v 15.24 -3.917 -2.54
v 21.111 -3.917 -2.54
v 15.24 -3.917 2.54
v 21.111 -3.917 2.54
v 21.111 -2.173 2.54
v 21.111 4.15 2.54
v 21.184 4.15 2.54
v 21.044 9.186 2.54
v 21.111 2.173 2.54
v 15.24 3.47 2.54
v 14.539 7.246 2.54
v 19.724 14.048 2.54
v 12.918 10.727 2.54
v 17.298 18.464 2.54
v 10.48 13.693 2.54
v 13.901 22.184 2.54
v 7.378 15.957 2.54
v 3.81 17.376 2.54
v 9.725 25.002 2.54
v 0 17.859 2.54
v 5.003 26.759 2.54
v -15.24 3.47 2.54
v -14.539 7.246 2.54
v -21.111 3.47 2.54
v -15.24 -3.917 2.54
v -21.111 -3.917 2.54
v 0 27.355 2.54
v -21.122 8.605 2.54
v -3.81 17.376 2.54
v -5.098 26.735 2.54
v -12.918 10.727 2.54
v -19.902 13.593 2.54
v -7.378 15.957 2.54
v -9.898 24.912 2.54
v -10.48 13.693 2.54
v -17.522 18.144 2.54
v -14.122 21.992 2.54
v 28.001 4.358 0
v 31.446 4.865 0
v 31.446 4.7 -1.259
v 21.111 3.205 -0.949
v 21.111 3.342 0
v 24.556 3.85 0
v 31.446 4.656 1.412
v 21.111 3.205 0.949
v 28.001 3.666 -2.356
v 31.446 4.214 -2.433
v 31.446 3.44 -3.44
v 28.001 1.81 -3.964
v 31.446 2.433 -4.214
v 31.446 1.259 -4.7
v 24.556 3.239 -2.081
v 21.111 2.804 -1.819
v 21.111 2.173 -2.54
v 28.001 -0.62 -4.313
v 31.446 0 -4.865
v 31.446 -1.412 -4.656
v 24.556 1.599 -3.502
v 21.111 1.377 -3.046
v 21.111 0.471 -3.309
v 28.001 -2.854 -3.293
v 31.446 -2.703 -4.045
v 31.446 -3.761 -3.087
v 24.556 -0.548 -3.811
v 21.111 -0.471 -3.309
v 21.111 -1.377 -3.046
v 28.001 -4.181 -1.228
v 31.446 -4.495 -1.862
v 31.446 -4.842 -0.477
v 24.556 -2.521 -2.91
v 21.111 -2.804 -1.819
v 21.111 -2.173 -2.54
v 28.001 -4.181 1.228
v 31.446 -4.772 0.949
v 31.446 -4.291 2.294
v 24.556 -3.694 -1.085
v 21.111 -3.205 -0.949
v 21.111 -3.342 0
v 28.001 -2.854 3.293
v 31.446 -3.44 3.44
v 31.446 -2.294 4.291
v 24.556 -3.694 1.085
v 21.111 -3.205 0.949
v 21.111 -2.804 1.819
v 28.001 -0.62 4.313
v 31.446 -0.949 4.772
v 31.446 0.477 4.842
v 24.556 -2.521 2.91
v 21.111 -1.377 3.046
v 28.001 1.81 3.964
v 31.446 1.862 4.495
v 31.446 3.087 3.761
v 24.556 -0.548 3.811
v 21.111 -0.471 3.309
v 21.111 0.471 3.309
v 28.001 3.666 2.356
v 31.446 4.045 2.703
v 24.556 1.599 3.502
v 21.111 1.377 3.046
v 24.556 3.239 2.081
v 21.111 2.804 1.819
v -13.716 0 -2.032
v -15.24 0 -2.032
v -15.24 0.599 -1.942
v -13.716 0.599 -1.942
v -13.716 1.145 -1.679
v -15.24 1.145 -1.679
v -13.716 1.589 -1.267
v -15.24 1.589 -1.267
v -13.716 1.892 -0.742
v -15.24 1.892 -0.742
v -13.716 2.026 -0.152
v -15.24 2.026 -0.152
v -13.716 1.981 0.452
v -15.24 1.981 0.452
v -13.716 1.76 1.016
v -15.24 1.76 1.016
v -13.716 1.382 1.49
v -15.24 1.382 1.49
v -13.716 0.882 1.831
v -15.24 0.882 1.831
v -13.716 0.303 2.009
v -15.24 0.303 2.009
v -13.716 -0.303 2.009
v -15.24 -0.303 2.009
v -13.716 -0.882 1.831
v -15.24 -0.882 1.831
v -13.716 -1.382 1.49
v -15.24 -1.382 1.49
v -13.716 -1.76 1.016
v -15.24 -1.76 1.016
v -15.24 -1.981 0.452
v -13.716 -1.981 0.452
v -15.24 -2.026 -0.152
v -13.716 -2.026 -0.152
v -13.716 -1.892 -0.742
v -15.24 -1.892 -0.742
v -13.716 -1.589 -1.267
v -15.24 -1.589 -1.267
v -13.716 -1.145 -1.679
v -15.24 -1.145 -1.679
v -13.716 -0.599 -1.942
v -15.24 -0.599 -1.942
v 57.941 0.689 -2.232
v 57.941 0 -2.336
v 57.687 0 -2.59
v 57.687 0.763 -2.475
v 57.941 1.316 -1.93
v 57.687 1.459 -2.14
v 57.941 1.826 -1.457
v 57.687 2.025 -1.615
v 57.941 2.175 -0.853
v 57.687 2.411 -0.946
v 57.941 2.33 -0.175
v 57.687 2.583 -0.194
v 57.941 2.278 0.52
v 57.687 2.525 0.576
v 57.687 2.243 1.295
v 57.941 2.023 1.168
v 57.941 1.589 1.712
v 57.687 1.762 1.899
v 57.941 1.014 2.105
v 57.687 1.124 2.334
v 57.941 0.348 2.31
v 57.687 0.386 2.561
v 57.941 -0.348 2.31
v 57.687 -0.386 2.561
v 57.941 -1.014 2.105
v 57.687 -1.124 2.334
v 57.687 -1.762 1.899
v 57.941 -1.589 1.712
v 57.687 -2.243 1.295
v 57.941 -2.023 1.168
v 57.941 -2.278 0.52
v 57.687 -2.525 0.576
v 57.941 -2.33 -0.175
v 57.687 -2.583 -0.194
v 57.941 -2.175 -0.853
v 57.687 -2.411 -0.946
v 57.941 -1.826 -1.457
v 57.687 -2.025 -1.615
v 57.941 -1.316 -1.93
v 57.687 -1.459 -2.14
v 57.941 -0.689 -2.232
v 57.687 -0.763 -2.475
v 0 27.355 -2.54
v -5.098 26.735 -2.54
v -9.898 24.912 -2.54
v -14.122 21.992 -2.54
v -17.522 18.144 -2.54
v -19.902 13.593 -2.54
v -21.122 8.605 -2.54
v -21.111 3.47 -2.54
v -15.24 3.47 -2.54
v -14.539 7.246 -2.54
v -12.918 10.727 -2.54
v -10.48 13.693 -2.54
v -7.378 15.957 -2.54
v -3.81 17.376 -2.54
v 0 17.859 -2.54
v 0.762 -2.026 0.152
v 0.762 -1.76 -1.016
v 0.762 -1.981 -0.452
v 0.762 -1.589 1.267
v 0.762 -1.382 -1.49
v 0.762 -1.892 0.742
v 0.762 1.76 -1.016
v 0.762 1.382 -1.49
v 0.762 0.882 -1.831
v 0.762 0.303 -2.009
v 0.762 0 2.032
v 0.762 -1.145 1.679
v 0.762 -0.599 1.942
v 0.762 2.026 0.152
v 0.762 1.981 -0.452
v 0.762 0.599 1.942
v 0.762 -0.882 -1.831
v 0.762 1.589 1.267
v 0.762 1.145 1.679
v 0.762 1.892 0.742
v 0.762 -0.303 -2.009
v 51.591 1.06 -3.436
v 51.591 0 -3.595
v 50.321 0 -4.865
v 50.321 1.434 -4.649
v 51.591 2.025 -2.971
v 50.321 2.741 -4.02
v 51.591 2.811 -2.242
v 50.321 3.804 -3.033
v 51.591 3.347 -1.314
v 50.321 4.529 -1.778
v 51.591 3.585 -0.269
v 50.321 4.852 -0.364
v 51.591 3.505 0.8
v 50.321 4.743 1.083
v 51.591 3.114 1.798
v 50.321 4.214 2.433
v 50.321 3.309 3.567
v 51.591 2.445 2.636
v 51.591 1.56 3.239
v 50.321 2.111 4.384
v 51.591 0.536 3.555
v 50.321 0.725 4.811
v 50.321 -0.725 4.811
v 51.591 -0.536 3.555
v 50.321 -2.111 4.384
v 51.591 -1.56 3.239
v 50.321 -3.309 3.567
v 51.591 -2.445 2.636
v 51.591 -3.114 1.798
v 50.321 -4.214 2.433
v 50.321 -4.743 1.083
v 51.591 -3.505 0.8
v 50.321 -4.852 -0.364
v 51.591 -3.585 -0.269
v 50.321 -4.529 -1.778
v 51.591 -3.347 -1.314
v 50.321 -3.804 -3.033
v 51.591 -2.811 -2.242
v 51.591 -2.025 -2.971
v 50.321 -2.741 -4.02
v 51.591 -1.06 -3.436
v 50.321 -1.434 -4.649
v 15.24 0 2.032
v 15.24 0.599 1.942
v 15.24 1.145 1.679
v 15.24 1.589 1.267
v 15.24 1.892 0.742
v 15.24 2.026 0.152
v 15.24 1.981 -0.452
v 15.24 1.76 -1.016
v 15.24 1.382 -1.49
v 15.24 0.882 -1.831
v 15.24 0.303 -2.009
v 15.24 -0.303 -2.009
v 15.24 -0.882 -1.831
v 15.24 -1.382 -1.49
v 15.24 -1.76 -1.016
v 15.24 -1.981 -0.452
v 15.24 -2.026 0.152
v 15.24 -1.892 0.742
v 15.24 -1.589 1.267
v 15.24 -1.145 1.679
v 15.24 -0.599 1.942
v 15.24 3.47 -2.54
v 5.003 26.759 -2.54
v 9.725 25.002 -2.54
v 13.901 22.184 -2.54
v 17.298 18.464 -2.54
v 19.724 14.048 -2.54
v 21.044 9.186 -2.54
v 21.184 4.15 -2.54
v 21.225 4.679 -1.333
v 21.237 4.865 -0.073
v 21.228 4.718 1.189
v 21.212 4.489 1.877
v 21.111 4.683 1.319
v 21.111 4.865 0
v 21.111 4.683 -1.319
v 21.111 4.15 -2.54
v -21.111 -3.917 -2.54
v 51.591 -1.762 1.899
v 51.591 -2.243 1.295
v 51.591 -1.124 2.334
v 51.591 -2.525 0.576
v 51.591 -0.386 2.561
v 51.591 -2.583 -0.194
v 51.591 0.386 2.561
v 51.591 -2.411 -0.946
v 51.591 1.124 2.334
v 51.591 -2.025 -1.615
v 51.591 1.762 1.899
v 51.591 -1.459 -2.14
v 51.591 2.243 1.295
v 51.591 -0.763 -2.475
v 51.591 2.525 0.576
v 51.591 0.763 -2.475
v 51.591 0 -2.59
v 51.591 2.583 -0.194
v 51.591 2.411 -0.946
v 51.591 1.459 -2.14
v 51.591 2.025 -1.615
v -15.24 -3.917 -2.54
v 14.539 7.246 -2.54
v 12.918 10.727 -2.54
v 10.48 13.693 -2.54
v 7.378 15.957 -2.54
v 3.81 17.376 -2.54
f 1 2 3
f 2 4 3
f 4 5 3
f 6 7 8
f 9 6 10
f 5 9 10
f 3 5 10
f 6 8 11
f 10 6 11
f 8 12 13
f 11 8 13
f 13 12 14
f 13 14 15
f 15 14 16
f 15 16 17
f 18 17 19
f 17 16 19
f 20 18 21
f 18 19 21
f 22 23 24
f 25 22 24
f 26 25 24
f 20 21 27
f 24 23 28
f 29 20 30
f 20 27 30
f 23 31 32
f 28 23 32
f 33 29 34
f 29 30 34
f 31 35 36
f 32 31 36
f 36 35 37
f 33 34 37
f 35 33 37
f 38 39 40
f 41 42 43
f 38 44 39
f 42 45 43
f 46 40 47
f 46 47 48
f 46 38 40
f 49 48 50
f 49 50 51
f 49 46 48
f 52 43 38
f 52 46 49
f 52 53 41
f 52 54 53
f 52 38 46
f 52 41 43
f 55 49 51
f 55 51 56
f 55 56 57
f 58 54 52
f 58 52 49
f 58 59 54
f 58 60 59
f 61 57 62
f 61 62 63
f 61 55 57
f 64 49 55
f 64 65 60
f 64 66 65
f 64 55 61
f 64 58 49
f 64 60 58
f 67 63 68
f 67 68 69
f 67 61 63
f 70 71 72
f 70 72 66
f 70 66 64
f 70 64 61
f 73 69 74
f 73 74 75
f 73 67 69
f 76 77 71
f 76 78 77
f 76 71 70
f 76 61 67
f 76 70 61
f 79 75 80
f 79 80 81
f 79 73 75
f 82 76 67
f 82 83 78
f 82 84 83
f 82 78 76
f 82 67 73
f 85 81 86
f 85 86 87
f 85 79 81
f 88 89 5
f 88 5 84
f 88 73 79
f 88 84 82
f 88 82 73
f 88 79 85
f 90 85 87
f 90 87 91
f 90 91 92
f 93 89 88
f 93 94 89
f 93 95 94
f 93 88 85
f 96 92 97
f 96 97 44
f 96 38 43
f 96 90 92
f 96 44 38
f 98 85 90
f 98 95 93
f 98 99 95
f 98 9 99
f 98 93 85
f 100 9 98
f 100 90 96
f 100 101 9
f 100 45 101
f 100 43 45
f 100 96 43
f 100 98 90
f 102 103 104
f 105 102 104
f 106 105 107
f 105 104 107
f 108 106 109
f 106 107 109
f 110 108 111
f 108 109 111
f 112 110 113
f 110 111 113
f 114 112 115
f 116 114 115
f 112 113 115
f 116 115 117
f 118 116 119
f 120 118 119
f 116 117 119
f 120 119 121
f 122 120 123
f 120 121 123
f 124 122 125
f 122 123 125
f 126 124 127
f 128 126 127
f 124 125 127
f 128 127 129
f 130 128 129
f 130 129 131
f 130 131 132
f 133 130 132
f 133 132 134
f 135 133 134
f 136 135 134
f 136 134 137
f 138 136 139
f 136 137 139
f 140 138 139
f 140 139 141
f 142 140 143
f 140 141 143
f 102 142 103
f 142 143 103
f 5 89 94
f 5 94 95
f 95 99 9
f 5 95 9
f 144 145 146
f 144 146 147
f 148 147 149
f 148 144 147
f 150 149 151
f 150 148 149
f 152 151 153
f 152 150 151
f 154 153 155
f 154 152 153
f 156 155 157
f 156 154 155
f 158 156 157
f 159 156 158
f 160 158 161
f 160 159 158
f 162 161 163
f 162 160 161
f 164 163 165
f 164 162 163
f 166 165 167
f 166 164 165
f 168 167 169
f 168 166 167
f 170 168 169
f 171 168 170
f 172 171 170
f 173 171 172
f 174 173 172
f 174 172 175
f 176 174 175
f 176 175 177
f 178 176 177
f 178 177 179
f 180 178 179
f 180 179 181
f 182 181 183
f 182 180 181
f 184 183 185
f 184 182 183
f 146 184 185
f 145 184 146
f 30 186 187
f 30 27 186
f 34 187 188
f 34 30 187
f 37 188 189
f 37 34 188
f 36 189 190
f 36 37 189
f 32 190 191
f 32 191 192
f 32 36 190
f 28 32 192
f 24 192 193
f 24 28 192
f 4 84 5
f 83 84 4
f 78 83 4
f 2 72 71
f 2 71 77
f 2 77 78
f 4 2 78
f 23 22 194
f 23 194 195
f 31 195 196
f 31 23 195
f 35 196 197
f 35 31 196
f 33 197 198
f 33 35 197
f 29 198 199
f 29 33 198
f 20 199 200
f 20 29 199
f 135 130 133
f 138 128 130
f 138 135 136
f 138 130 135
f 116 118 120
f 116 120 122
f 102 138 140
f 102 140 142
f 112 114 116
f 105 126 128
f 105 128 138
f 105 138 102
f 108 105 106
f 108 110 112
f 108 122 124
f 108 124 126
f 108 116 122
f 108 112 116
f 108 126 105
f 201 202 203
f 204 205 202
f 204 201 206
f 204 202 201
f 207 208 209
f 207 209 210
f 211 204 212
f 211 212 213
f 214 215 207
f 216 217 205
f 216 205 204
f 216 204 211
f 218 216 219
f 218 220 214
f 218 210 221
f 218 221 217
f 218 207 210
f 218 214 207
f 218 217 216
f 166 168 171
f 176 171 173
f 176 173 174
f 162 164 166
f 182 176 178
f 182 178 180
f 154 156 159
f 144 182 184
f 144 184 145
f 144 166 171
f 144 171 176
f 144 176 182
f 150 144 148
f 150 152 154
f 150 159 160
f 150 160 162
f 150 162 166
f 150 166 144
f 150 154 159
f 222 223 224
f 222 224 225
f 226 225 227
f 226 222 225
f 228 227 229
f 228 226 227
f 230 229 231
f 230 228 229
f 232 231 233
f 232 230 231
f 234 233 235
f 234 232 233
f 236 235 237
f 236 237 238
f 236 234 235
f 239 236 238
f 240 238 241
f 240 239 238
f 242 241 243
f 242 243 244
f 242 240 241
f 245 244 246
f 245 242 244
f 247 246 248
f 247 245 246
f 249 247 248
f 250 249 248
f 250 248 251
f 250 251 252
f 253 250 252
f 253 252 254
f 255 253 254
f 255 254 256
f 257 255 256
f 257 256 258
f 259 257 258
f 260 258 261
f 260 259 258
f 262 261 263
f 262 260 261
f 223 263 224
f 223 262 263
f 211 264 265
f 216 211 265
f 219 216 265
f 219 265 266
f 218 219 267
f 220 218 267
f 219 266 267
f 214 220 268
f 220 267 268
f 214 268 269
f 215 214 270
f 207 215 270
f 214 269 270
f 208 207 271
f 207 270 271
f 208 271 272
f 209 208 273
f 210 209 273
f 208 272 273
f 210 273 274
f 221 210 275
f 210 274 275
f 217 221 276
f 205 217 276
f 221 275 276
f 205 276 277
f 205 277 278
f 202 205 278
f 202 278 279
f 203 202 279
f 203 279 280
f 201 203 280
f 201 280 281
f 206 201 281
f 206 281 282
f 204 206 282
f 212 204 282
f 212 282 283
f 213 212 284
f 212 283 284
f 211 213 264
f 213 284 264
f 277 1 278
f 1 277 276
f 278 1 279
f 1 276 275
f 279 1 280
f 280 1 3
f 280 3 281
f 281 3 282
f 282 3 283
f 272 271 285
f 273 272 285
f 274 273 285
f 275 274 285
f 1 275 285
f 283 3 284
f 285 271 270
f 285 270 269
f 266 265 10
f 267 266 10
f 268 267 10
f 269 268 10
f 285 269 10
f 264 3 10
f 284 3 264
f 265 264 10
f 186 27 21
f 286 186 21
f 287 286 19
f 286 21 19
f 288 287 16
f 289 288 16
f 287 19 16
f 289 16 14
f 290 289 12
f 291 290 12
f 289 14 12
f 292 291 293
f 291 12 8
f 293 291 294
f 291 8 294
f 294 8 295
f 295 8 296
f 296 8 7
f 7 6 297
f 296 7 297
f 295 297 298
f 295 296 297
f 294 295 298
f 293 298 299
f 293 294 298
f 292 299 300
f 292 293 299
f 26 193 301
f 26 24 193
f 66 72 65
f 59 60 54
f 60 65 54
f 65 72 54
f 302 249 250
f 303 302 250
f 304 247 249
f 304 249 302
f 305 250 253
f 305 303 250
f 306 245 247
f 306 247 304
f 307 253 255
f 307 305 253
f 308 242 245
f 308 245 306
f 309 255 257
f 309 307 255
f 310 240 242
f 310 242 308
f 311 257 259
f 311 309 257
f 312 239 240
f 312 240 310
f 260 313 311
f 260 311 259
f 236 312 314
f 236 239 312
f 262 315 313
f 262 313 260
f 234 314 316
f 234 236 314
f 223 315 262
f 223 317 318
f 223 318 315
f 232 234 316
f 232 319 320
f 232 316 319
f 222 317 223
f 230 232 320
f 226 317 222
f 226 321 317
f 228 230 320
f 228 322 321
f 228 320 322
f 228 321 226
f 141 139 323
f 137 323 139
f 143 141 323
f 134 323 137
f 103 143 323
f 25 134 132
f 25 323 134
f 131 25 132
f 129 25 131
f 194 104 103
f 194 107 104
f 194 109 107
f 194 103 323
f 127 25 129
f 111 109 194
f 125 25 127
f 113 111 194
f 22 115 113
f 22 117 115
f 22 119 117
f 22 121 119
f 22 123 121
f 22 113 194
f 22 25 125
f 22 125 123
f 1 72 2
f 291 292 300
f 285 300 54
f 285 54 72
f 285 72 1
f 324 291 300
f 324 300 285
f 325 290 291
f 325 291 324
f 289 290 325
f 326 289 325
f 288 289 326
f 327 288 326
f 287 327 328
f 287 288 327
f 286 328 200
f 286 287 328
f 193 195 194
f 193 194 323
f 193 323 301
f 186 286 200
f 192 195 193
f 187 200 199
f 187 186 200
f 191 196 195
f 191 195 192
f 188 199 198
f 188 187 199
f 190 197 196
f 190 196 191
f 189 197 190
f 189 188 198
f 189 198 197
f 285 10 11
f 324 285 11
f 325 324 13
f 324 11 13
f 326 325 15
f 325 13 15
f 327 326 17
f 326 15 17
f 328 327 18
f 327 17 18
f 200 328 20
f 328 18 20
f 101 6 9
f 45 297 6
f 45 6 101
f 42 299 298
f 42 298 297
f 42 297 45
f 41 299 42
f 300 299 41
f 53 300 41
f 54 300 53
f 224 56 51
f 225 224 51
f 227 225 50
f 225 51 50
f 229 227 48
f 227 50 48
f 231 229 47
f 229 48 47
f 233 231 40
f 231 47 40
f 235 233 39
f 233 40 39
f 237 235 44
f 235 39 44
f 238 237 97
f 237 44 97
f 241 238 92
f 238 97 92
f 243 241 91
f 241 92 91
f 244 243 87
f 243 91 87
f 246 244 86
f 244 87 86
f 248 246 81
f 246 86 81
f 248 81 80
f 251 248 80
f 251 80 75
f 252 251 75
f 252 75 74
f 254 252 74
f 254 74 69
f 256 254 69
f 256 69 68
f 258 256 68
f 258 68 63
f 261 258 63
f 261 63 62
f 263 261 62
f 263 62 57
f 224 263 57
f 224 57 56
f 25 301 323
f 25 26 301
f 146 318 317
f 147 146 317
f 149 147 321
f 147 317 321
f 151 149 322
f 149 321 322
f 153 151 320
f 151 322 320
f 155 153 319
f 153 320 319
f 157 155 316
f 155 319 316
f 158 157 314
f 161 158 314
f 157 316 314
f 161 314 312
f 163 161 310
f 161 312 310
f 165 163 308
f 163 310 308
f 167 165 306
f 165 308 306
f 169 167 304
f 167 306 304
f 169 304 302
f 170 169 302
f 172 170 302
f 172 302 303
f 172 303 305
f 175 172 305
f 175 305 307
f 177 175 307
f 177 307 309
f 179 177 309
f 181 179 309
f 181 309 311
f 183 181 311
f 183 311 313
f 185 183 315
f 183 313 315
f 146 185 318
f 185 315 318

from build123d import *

# Parameters (mm, degrees)
BOSS_EXTRUDE1_DEPTH = 2.54
SKETCH3_R           = 4.865340766
BOSS_EXTRUDE2_DEPTH = 30.48
CHAMFER5_SIZE       = 1.27
SKETCH5_R           = 2.590082511
BOSS_EXTRUDE3_DEPTH = 6.35
CHAMFER6_SIZE       = 0.254
SKETCH6_R           = 2.032
BOSS_EXTRUDE4_DEPTH = 1.524
SKETCH7_R           = 2.032
BOSS_EXTRUDE5_DEPTH = 14.478


with BuildPart() as part:
    # Sketch2 → Boss-Extrude1 (new body, symmetric)
    with BuildSketch(Plane.XY):
        with BuildLine():
            Line((-21.110510204, -3.916551019), (-15.24, -3.916551019))
            Line((-15.24, -3.916551019), (-15.24, 3.470183675))
            ThreePointArc((-15.24, 3.470183675), (-10.479530006, 13.693144777), (0, 17.858533009))
            Line((0, 17.858533009), (0, 27.35528296))
            ThreePointArc((0, 27.35528296), (-15.938566505, 20.170697643), (-21.110510204, 3.470183675))
            Line((-21.110510204, 3.470183675), (-21.110510204, -3.916551019))
        make_face()
    boss_extrude1 = extrude(amount=BOSS_EXTRUDE1_DEPTH, both=True)

    # Mirror1: Boss-Extrude1 across plane
    add(boss_extrude1.mirror(Plane(origin=(0, 0, 0), x_dir=(0, 0, 1), z_dir=(1, 0, 0))))

    # Sketch3 → Boss-Extrude2 (add)
    with BuildSketch(Plane(origin=(21.110510204, 0, 0), x_dir=(0, 0, -1), z_dir=(1, 0, 0))):
        Circle(SKETCH3_R)
    extrude(amount=BOSS_EXTRUDE2_DEPTH)

    # Sketch4 → Cut-Revolve1 (revolve, cut)
    with BuildSketch(Plane.XY):
        Polygon((21.110510204, 3.342420759), (21.110510204, 4.865340766), (31.445897446, 4.865340766), align=None)
    revolve(axis=Axis((51.590510204, 0, 0), (-1, 0, 0)), mode=Mode.SUBTRACT)

    # Chamfer5
    chamfer5_edges = [part.edges().sort_by_distance(p)[0] for p in [
        (51.590510204, 0, 4.865340766),
    ]]
    chamfer(chamfer5_edges, length=CHAMFER5_SIZE)

    # Sketch5 → Boss-Extrude3 (add)
    with BuildSketch(Plane(origin=(51.590510204, 0, 0), x_dir=(0, 0, -1), z_dir=(1, 0, 0))):
        Circle(SKETCH5_R)
    extrude(amount=BOSS_EXTRUDE3_DEPTH)

    # Chamfer6
    chamfer6_edges = [part.edges().sort_by_distance(p)[0] for p in [
        (57.940510204, 0, 2.590082511),
    ]]
    chamfer(chamfer6_edges, length=CHAMFER6_SIZE)

    # Sketch6 → Boss-Extrude4 (add)
    with BuildSketch(Plane(origin=(-15.24, 0, 0), x_dir=(0, 0, -1), z_dir=(1, 0, 0))):
        Circle(SKETCH6_R)
    extrude(amount=BOSS_EXTRUDE4_DEPTH)

    # Sketch7 → Boss-Extrude5 (add)
    with BuildSketch(Plane.ZY.offset(-15.24)):
        Circle(SKETCH7_R)
    extrude(amount=BOSS_EXTRUDE5_DEPTH)


solid = part.part
